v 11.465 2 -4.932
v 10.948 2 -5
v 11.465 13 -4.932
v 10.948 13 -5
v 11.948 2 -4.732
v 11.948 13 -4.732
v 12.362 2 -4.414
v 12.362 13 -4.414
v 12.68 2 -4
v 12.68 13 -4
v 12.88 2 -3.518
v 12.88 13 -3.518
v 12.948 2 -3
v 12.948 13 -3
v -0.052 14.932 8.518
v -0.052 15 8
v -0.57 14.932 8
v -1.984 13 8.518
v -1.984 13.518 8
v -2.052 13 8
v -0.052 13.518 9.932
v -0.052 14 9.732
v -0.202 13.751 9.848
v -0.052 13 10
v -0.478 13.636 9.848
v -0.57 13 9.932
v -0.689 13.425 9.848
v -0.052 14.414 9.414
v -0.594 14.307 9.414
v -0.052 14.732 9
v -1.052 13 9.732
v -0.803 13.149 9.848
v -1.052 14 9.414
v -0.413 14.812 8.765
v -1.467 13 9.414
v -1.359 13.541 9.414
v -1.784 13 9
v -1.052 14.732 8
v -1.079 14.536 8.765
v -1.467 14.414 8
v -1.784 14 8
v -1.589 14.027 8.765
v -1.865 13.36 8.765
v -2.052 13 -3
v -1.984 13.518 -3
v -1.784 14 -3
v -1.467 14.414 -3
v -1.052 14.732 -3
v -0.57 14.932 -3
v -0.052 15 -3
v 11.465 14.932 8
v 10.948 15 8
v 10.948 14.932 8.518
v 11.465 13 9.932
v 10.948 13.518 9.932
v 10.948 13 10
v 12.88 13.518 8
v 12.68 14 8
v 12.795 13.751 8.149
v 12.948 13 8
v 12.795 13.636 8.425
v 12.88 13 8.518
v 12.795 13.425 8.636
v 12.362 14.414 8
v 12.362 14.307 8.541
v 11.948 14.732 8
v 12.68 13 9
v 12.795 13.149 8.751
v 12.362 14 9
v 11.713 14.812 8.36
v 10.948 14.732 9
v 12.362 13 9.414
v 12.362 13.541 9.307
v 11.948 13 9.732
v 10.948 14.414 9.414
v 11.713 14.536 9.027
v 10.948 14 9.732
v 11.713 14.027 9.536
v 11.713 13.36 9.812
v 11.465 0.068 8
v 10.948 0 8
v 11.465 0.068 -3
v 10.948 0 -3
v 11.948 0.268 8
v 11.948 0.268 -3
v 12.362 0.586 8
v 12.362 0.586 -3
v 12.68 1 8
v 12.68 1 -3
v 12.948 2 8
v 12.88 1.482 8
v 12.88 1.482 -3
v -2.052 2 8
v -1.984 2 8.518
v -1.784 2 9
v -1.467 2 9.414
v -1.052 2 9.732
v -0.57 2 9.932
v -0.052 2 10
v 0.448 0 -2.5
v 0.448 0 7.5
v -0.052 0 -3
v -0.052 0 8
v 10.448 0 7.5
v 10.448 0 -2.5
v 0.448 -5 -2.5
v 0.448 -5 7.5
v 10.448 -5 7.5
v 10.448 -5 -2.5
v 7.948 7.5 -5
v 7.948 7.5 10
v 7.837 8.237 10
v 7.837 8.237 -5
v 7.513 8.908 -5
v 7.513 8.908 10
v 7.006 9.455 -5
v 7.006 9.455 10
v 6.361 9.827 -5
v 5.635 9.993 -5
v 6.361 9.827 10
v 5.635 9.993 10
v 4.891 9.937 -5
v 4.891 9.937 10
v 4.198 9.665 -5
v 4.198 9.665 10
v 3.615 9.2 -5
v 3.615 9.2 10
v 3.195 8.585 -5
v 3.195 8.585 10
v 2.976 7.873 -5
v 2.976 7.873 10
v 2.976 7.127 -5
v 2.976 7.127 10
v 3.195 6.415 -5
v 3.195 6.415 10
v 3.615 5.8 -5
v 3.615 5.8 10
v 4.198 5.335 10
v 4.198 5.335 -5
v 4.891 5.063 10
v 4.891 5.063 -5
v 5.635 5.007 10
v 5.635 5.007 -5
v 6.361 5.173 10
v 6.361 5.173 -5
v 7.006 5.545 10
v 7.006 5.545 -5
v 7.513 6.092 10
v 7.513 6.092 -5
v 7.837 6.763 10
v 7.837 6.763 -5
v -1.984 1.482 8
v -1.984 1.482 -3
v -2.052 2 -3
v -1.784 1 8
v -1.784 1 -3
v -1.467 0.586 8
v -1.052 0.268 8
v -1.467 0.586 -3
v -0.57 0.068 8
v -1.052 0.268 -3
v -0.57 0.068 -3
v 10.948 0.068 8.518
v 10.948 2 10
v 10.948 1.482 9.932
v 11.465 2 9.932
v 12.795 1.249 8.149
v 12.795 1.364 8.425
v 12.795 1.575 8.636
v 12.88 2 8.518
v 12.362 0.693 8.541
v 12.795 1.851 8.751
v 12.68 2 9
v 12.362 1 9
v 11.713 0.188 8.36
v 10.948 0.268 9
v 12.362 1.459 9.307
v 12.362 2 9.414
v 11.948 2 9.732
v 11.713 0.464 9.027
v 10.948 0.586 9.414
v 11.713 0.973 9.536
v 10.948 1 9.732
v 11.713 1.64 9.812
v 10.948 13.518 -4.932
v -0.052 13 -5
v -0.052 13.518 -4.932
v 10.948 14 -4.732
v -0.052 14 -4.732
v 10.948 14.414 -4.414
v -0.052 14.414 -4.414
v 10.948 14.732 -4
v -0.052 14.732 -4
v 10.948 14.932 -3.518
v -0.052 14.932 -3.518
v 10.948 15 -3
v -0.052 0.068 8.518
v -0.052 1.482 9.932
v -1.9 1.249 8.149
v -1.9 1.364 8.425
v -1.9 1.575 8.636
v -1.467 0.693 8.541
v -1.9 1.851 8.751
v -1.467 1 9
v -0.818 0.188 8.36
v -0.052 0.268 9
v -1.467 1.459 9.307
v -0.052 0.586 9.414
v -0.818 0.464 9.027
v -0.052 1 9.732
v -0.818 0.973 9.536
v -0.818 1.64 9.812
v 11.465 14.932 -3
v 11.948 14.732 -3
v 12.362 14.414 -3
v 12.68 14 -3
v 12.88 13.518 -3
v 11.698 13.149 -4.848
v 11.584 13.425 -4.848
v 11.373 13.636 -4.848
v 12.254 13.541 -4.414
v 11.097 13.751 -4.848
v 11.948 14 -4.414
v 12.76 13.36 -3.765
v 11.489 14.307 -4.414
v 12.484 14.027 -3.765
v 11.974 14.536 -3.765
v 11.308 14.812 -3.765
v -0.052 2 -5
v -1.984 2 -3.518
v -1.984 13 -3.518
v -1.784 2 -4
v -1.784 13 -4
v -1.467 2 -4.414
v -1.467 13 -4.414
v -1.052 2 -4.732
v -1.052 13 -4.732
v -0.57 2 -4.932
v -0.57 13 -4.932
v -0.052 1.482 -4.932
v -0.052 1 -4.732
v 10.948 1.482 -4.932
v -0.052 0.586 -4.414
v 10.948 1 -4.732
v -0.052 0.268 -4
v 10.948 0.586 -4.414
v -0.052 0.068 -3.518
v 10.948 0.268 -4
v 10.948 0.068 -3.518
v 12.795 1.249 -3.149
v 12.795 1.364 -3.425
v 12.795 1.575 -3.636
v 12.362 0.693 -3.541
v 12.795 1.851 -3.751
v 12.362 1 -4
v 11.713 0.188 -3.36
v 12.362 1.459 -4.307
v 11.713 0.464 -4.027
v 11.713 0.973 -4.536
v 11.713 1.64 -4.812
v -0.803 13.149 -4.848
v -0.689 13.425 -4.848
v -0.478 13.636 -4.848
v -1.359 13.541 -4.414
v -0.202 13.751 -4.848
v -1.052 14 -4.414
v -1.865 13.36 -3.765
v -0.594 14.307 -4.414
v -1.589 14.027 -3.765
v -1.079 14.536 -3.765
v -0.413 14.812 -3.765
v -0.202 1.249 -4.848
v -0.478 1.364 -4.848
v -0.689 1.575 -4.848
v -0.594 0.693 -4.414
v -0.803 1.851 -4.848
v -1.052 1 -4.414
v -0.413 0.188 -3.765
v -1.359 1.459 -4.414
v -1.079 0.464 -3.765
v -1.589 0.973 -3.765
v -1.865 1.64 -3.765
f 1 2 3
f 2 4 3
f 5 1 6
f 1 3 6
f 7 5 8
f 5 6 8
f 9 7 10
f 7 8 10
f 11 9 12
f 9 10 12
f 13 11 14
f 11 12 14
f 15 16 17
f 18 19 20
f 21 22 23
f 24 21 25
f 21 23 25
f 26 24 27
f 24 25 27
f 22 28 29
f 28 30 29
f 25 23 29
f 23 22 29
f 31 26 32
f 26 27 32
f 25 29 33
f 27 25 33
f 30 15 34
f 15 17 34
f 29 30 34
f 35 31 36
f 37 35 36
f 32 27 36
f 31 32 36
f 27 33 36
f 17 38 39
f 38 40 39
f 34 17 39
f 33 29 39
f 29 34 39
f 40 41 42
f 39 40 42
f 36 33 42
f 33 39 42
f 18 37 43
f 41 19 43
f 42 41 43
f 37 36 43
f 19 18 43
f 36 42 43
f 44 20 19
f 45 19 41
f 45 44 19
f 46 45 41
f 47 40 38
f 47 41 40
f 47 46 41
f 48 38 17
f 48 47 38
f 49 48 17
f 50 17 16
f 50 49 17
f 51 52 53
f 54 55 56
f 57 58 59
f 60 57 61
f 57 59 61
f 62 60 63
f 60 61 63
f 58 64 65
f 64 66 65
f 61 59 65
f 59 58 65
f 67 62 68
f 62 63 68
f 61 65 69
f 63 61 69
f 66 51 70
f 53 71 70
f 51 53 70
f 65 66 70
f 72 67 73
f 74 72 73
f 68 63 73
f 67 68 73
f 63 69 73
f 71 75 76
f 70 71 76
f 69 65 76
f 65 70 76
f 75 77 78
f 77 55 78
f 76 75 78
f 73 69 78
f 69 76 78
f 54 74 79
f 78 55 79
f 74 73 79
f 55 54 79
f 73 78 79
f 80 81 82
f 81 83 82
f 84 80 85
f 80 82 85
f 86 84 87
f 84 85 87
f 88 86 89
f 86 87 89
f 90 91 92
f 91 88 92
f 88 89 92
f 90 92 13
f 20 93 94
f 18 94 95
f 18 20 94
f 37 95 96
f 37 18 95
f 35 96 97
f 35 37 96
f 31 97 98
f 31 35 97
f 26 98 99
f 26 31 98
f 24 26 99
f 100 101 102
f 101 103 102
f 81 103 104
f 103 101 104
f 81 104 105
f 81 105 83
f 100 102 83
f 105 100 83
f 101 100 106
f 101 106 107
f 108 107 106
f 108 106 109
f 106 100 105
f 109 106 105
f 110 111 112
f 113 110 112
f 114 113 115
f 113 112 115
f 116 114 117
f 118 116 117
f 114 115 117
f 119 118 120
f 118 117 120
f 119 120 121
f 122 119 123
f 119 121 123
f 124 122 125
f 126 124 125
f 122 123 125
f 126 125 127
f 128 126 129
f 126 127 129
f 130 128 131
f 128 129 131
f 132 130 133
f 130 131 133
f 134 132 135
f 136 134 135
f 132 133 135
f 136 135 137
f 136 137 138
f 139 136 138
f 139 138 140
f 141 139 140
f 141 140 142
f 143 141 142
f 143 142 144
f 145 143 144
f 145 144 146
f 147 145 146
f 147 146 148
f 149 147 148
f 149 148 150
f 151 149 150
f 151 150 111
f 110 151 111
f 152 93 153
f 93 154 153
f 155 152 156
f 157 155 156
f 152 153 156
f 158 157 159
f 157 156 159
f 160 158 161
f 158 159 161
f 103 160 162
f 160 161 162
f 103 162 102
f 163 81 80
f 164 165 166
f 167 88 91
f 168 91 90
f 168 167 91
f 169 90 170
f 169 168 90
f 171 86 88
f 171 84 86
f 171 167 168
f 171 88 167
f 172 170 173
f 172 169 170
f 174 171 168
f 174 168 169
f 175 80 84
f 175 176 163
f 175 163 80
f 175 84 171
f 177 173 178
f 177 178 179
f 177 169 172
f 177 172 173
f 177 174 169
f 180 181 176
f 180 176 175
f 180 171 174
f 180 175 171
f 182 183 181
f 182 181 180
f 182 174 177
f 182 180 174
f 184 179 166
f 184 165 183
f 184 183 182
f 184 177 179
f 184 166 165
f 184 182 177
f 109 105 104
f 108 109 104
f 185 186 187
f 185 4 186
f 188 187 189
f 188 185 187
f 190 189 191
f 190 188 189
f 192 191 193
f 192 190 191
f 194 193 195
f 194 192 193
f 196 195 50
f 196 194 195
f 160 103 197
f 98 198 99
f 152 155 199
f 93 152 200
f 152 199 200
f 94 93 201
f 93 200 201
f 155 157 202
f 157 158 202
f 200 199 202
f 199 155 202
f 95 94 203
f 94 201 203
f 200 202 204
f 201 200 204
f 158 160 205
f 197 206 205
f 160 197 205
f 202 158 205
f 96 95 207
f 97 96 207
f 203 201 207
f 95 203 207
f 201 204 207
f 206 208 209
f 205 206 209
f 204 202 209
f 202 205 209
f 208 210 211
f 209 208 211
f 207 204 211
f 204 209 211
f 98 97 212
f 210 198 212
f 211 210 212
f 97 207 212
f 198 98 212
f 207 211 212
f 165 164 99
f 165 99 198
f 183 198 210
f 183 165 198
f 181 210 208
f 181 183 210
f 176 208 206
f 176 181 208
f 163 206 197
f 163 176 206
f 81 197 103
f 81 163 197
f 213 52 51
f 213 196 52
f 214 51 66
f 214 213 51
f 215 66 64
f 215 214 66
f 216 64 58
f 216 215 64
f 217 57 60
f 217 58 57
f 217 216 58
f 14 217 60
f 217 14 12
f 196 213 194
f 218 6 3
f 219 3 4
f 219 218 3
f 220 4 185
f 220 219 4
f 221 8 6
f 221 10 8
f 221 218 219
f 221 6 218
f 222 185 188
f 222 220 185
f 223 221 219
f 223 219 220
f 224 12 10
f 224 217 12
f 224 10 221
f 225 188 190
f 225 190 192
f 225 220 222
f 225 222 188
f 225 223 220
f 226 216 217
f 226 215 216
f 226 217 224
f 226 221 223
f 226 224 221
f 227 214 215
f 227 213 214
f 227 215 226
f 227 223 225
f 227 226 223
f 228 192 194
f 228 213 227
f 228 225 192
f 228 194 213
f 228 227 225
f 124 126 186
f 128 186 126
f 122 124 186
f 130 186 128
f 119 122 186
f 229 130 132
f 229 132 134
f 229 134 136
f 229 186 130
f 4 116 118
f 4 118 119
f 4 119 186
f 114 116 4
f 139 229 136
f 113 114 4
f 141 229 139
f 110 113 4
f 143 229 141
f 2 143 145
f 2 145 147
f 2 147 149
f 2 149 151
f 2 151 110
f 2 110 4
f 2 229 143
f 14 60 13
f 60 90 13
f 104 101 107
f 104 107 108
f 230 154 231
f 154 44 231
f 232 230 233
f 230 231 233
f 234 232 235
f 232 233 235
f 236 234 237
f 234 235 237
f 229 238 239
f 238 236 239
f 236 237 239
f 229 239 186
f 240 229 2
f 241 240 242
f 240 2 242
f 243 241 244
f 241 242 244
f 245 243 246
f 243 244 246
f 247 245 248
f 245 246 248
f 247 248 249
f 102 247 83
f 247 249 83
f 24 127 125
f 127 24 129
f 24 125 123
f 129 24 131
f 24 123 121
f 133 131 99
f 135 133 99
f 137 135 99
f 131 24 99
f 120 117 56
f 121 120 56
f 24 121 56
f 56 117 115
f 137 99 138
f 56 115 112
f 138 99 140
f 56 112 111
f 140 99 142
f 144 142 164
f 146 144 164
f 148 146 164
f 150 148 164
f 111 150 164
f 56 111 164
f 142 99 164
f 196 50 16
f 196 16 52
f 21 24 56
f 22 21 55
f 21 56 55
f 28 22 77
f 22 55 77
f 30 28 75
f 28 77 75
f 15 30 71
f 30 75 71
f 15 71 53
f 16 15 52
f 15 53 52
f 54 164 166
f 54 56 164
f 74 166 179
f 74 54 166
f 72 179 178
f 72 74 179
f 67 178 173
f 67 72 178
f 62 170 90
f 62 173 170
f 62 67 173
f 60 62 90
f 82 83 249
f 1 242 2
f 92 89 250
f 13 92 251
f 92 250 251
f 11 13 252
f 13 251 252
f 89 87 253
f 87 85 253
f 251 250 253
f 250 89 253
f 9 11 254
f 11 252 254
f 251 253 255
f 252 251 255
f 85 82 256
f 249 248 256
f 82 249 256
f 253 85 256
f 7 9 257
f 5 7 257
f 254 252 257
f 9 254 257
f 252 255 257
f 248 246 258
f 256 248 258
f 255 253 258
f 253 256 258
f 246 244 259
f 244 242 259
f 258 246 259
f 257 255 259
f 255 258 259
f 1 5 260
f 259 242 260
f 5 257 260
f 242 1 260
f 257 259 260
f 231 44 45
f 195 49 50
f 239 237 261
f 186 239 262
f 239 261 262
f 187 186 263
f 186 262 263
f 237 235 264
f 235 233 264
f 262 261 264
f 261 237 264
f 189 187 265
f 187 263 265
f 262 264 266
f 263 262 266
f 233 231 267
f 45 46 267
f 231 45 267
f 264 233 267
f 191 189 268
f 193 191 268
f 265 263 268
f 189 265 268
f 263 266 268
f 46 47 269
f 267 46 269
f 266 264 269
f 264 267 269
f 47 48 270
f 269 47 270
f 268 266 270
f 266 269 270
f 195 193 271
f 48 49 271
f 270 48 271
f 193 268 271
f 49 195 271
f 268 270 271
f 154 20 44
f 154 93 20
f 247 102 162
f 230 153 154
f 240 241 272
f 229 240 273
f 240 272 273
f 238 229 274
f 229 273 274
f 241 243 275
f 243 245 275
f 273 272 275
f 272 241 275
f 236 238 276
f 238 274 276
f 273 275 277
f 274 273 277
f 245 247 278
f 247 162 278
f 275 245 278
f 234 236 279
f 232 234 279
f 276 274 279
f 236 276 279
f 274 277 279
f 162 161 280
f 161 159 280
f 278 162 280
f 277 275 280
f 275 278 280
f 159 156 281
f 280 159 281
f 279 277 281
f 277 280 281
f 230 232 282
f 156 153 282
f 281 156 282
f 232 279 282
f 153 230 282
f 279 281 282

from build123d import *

# Parameters (mm, degrees)
SKETCH1_W           = 15
SKETCH1_H           = 15
BOSS_EXTRUDE1_DEPTH = 15
SKETCH2_W           = 10
SKETCH2_H           = 10
BOSS_EXTRUDE2_DEPTH = 5
SKETCH3_R           = 2.5
CUT_EXTRUDE1_DEPTH  = 25.852419528
FILLET1_R           = 2


with BuildPart() as part:
    # Sketch1 → Boss-Extrude1 (new body)
    with BuildSketch(Plane(origin=(0, 0, 0), x_dir=(1, 0, 0), z_dir=(0, 1, 0))):
        with Locations((5.447693091, -2.5)):
            Rectangle(SKETCH1_W, SKETCH1_H)
    extrude(amount=BOSS_EXTRUDE1_DEPTH)

    # Sketch2 → Boss-Extrude2 (add)
    with BuildSketch(Plane.XZ):
        with Locations((5.447693091, 2.5)):
            Rectangle(SKETCH2_W, SKETCH2_H)
    extrude(amount=BOSS_EXTRUDE2_DEPTH)

    # Sketch3 → Cut-Extrude1 (cut, through all)
    with BuildSketch(Plane.XY.offset(10)):
        with Locations((5.447693091, 7.5)):
            Circle(SKETCH3_R)
    extrude(amount=-CUT_EXTRUDE1_DEPTH, mode=Mode.SUBTRACT)

    # Fillet1
    fillet1_edges = [part.edges().sort_by_distance(p)[0] for p in [
        (-2.052306909, 15, 2.5),
        (5.447693091, 15, 10),
        (12.947693091, 15, 2.5),
        (5.447693091, 0, 10),
        (-2.052306909, 0, 2.5),
        (5.447693091, 0, -5),
        (12.947693091, 0, 2.5),
        (12.947693091, 7.5, 10),
        (-2.052306909, 7.5, 10),
        (-2.052306909, 7.5, -5),
        (12.947693091, 7.5, -5),
        (5.447693091, 15, -5),
    ]]
    fillet(fillet1_edges, radius=FILLET1_R)


solid = part.part
